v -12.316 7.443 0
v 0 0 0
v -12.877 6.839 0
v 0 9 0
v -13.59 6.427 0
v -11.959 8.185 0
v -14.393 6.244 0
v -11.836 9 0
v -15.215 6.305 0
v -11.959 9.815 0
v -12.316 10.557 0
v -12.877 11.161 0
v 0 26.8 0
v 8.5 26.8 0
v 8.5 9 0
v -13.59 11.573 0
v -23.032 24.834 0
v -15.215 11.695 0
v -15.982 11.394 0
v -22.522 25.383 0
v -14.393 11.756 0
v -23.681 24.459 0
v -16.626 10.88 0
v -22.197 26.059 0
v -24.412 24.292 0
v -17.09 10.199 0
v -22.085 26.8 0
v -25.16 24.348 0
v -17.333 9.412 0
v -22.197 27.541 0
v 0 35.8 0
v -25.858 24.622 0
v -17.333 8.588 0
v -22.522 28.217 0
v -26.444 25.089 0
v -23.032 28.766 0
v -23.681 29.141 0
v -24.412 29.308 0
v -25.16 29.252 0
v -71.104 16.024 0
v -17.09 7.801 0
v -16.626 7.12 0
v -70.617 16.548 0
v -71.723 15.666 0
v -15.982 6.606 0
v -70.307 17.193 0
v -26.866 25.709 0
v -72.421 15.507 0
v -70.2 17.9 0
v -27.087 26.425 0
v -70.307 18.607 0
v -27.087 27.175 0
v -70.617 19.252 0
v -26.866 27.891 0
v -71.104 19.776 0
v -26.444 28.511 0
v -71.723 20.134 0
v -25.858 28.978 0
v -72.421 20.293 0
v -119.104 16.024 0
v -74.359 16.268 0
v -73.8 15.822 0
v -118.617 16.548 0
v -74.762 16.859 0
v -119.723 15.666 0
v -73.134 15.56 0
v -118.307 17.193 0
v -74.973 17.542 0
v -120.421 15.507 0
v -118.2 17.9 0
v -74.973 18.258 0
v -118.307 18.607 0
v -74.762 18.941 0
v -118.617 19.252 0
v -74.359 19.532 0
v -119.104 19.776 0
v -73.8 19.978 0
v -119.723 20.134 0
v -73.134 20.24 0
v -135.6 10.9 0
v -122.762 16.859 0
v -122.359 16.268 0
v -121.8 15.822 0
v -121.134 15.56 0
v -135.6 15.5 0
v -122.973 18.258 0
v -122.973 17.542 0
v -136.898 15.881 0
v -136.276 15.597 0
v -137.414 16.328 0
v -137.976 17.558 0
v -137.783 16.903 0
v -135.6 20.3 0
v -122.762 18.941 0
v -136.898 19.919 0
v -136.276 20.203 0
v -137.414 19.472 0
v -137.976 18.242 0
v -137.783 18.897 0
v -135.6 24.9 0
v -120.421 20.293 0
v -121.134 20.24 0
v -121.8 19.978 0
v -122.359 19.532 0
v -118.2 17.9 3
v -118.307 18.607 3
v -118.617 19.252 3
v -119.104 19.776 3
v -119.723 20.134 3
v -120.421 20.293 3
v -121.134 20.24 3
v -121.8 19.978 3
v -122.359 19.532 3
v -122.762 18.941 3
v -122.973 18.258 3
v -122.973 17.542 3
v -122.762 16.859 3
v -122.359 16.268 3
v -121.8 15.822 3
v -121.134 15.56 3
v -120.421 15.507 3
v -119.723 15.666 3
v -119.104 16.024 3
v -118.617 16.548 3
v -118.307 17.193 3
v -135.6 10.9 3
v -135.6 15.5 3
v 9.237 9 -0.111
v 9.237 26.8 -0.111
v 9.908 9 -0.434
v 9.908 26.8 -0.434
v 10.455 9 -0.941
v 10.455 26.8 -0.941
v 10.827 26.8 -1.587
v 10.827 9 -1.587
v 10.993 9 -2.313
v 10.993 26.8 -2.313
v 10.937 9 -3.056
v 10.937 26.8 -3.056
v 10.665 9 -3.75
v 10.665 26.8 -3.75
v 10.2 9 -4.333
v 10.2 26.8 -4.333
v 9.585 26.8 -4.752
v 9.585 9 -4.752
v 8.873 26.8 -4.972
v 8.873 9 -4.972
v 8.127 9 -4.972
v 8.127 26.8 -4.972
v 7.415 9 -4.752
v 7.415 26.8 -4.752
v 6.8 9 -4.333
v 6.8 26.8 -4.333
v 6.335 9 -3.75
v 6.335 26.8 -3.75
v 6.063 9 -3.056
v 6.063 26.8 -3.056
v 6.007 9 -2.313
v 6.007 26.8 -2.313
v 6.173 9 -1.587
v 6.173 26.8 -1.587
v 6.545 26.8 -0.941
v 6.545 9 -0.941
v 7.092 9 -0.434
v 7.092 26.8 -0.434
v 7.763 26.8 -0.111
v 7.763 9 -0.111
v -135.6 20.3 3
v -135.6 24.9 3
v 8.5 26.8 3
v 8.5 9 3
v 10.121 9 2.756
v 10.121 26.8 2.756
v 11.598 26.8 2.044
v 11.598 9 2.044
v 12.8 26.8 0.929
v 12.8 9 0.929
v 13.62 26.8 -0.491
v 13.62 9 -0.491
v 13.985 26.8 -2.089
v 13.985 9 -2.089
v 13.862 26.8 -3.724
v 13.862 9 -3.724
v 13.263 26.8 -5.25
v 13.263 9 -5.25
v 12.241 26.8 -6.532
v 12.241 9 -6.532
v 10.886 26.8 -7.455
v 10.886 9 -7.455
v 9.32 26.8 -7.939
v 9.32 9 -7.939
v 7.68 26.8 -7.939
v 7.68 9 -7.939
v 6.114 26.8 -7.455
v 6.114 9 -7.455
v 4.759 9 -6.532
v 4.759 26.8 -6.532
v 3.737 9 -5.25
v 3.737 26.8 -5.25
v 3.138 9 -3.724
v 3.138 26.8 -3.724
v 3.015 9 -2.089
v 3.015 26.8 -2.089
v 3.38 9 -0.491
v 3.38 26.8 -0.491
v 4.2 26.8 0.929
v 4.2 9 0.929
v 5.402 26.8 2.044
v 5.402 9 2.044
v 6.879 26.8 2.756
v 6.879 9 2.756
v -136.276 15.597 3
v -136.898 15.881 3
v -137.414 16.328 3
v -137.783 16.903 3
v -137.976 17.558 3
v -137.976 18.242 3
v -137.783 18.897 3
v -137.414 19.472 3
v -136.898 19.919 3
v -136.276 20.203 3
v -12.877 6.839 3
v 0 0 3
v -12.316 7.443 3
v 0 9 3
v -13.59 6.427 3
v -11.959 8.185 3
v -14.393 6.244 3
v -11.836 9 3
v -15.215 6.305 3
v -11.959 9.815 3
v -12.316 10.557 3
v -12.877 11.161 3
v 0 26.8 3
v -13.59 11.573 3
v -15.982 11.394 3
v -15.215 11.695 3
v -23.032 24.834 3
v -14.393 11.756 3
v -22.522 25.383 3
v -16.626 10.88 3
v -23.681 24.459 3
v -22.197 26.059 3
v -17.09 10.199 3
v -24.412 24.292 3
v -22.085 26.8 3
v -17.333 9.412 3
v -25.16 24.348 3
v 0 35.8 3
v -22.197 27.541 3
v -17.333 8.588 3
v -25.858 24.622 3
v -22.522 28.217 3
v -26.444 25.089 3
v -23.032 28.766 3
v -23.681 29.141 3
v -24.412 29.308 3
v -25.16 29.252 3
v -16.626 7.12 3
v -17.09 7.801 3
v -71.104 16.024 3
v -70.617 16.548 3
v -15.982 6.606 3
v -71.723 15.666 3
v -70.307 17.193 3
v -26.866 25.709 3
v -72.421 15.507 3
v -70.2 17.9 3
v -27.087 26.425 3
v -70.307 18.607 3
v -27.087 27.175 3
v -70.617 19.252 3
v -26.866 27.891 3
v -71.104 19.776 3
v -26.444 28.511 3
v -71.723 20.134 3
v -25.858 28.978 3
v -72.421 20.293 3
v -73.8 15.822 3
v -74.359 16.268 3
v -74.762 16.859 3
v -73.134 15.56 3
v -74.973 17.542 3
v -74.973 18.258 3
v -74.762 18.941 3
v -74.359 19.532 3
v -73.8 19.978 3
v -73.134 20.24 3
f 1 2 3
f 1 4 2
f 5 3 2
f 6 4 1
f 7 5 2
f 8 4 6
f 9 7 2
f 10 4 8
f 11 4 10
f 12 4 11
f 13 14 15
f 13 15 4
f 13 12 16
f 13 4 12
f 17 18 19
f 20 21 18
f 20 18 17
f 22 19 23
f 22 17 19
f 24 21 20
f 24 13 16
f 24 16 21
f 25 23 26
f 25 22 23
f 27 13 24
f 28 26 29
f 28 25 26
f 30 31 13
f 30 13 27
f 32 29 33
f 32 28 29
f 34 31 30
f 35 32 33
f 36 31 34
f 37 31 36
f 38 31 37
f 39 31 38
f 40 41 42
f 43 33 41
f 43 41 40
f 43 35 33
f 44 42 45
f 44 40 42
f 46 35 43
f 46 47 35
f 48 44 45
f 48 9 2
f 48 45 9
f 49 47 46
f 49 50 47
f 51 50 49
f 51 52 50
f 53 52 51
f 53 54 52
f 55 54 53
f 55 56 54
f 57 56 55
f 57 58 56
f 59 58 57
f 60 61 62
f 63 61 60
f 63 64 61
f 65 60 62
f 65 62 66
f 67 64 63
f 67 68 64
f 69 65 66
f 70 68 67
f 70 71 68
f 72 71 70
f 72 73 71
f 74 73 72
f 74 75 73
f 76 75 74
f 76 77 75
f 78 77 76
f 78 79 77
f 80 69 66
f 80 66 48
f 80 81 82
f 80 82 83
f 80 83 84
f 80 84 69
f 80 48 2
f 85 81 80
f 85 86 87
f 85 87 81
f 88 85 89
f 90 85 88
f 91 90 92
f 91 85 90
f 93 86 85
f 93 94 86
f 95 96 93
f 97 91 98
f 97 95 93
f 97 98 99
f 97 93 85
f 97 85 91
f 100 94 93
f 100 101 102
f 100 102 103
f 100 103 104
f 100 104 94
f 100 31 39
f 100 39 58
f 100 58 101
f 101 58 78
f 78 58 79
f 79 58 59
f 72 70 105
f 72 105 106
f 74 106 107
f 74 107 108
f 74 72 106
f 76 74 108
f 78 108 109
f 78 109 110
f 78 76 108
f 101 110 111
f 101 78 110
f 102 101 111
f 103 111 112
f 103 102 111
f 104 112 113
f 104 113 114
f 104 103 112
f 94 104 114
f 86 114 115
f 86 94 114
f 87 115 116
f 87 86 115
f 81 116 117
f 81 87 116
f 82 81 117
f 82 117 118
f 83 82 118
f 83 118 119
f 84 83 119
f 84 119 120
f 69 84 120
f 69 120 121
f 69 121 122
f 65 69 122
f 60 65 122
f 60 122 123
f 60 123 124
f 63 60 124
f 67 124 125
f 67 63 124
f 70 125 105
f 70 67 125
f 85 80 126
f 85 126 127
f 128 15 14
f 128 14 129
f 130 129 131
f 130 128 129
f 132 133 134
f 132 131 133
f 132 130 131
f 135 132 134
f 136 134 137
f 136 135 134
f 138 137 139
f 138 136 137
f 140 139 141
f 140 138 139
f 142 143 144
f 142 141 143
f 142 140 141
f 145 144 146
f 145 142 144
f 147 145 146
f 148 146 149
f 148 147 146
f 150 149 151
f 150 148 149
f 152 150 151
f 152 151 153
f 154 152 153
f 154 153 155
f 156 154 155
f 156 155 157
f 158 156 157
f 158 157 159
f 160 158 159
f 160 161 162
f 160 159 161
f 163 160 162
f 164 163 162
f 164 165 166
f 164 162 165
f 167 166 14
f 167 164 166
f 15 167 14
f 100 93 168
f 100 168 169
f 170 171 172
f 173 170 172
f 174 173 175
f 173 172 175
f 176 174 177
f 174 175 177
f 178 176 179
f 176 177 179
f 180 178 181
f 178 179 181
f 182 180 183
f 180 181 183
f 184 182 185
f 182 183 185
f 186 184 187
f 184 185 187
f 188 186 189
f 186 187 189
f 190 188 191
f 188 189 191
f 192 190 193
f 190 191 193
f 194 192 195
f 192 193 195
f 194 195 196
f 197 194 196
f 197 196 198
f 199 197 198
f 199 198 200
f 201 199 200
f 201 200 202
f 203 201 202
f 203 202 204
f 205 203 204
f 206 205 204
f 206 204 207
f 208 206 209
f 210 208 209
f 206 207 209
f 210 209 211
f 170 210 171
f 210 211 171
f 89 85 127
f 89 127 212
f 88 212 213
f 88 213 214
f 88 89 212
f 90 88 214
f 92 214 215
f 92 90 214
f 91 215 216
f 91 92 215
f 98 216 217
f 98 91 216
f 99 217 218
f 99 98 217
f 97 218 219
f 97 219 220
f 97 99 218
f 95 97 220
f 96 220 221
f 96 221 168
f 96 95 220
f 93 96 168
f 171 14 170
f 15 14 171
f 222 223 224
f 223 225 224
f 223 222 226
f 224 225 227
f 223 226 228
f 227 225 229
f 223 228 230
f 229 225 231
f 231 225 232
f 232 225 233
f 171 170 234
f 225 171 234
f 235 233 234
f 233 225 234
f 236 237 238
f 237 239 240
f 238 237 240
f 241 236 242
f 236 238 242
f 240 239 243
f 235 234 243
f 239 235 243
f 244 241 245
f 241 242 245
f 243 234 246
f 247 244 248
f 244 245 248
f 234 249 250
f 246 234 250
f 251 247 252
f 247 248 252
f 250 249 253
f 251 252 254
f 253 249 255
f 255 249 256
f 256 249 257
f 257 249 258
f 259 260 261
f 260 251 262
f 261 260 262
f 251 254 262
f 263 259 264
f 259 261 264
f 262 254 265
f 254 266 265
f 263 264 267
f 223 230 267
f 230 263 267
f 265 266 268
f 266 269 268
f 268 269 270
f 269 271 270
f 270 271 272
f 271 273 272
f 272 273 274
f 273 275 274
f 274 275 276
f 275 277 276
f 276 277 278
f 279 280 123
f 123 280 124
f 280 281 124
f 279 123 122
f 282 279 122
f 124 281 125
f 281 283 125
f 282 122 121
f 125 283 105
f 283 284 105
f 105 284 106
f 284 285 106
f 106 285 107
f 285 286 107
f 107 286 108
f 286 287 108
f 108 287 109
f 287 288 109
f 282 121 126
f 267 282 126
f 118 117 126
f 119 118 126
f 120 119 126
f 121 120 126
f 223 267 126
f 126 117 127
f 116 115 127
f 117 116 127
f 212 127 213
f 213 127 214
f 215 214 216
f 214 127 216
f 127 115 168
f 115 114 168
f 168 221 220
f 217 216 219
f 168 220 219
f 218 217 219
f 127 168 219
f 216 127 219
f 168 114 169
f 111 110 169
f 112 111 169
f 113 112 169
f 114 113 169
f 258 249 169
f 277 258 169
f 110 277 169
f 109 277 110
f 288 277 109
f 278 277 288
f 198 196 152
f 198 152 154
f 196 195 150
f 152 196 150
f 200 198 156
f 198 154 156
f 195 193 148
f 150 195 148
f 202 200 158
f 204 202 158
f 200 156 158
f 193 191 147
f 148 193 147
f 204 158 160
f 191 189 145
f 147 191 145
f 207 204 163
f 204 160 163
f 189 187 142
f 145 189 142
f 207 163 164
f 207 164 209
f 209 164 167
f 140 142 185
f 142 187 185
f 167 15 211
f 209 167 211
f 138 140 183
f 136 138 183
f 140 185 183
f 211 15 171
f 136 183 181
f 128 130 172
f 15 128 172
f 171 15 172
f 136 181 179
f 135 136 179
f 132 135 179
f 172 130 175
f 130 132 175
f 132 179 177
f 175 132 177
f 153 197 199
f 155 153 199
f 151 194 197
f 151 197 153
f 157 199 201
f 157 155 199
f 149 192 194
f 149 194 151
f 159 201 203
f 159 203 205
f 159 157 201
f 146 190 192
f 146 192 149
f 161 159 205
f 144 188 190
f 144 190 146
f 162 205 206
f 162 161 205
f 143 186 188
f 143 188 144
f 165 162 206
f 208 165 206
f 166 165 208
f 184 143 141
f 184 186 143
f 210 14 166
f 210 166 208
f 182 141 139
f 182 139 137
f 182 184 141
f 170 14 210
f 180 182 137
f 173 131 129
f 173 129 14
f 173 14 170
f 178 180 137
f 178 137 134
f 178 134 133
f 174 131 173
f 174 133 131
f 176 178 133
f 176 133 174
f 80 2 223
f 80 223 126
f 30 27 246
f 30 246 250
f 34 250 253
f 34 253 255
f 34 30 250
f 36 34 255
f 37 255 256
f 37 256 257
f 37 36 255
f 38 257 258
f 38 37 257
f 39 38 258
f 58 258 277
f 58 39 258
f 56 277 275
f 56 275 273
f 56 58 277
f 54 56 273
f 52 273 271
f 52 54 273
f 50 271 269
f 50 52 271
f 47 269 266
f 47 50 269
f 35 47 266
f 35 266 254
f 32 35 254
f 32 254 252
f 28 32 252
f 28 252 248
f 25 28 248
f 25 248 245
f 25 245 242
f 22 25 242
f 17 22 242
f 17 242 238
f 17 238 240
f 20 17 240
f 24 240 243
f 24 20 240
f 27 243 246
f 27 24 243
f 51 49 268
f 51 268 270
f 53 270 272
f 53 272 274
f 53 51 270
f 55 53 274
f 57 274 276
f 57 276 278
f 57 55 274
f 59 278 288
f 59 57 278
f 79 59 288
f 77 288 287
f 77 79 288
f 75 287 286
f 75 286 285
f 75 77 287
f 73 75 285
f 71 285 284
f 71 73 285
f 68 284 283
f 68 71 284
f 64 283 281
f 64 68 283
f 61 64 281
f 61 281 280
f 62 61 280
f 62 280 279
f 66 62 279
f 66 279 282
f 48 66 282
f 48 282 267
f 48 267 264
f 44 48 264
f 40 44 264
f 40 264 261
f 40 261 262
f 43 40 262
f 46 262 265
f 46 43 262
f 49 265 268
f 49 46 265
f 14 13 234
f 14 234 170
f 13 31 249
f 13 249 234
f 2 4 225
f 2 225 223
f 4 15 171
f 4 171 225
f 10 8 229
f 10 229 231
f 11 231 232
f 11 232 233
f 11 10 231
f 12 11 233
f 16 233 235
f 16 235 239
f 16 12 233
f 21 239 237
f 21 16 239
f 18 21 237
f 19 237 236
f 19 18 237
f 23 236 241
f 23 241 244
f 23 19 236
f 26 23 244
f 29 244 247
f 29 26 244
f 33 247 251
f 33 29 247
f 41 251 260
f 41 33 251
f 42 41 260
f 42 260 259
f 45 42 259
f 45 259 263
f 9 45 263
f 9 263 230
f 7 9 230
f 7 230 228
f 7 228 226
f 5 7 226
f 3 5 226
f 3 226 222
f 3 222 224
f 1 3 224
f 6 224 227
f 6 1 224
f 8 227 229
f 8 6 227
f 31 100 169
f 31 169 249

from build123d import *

# Parameters (mm, degrees)
SKETCH1_R           = 2.4
SKETCH1_R_2         = 2.515000774
SKETCH1_R_3         = 2.764002303
BOSS_EXTRUDE1_DEPTH = 3
BOSS_EXTRUDE2_START = 9
SKETCH2_R           = 5.5
BOSS_EXTRUDE2_DEPTH = 17.8
SKETCH4_R           = 2.5
CUT_EXTRUDE1_DEPTH  = 143.792296711


with BuildPart() as part:
    # Sketch1 → Boss-Extrude1 (new body)
    with BuildSketch(Plane.XY):
        with BuildLine():
            Line((0, 0), (-135.6, 10.9))
            Line((-135.6, 10.9), (-135.6, 15.5))
            ThreePointArc((-135.6, 15.5), (-138, 17.9), (-135.6, 20.3))
            Line((-135.6, 20.3), (-135.6, 24.9))
            Line((-135.6, 24.9), (0, 35.8))
            Line((0, 35.8), (0, 26.8))
            Line((0, 26.8), (8.5, 26.8))
            Line((8.5, 26.8), (8.5, 9))
            Line((8.5, 9), (0, 9))
            Line((0, 9), (0, 0))
        make_face()
        with Locations((-120.6, 17.9)):
            Circle(SKETCH1_R, mode=Mode.SUBTRACT)
        with Locations((-72.6, 17.9)):
            Circle(SKETCH1_R, mode=Mode.SUBTRACT)
        with Locations((-24.6, 26.8)):
            Circle(SKETCH1_R_2, mode=Mode.SUBTRACT)
        with Locations((-14.6, 9)):
            Circle(SKETCH1_R_3, mode=Mode.SUBTRACT)
    extrude(amount=BOSS_EXTRUDE1_DEPTH)


with BuildPart() as body_2:
    # Sketch2 → Boss-Extrude2 (new body)
    with BuildSketch(Plane(origin=(0, 0, 0), x_dir=(1, 0, 0), z_dir=(0, 1, 0)).offset(BOSS_EXTRUDE2_START)):
        with Locations(Location((8.5, 2.5, 0), (0, 0, 270))):
            Circle(SKETCH2_R)
    extrude(amount=BOSS_EXTRUDE2_DEPTH)

    # Sketch4 → Cut-Extrude1 (cut, through all)
    with BuildSketch(Plane(origin=(0, 0, 0), x_dir=(1, 0, 0), z_dir=(0, 1, 0))):
        with Locations(Location((8.5, 2.5, 0), (0, 0, 270))):
            Circle(SKETCH4_R)
    extrude(amount=CUT_EXTRUDE1_DEPTH, mode=Mode.SUBTRACT)


solid = Compound([part.part, body_2.part])
